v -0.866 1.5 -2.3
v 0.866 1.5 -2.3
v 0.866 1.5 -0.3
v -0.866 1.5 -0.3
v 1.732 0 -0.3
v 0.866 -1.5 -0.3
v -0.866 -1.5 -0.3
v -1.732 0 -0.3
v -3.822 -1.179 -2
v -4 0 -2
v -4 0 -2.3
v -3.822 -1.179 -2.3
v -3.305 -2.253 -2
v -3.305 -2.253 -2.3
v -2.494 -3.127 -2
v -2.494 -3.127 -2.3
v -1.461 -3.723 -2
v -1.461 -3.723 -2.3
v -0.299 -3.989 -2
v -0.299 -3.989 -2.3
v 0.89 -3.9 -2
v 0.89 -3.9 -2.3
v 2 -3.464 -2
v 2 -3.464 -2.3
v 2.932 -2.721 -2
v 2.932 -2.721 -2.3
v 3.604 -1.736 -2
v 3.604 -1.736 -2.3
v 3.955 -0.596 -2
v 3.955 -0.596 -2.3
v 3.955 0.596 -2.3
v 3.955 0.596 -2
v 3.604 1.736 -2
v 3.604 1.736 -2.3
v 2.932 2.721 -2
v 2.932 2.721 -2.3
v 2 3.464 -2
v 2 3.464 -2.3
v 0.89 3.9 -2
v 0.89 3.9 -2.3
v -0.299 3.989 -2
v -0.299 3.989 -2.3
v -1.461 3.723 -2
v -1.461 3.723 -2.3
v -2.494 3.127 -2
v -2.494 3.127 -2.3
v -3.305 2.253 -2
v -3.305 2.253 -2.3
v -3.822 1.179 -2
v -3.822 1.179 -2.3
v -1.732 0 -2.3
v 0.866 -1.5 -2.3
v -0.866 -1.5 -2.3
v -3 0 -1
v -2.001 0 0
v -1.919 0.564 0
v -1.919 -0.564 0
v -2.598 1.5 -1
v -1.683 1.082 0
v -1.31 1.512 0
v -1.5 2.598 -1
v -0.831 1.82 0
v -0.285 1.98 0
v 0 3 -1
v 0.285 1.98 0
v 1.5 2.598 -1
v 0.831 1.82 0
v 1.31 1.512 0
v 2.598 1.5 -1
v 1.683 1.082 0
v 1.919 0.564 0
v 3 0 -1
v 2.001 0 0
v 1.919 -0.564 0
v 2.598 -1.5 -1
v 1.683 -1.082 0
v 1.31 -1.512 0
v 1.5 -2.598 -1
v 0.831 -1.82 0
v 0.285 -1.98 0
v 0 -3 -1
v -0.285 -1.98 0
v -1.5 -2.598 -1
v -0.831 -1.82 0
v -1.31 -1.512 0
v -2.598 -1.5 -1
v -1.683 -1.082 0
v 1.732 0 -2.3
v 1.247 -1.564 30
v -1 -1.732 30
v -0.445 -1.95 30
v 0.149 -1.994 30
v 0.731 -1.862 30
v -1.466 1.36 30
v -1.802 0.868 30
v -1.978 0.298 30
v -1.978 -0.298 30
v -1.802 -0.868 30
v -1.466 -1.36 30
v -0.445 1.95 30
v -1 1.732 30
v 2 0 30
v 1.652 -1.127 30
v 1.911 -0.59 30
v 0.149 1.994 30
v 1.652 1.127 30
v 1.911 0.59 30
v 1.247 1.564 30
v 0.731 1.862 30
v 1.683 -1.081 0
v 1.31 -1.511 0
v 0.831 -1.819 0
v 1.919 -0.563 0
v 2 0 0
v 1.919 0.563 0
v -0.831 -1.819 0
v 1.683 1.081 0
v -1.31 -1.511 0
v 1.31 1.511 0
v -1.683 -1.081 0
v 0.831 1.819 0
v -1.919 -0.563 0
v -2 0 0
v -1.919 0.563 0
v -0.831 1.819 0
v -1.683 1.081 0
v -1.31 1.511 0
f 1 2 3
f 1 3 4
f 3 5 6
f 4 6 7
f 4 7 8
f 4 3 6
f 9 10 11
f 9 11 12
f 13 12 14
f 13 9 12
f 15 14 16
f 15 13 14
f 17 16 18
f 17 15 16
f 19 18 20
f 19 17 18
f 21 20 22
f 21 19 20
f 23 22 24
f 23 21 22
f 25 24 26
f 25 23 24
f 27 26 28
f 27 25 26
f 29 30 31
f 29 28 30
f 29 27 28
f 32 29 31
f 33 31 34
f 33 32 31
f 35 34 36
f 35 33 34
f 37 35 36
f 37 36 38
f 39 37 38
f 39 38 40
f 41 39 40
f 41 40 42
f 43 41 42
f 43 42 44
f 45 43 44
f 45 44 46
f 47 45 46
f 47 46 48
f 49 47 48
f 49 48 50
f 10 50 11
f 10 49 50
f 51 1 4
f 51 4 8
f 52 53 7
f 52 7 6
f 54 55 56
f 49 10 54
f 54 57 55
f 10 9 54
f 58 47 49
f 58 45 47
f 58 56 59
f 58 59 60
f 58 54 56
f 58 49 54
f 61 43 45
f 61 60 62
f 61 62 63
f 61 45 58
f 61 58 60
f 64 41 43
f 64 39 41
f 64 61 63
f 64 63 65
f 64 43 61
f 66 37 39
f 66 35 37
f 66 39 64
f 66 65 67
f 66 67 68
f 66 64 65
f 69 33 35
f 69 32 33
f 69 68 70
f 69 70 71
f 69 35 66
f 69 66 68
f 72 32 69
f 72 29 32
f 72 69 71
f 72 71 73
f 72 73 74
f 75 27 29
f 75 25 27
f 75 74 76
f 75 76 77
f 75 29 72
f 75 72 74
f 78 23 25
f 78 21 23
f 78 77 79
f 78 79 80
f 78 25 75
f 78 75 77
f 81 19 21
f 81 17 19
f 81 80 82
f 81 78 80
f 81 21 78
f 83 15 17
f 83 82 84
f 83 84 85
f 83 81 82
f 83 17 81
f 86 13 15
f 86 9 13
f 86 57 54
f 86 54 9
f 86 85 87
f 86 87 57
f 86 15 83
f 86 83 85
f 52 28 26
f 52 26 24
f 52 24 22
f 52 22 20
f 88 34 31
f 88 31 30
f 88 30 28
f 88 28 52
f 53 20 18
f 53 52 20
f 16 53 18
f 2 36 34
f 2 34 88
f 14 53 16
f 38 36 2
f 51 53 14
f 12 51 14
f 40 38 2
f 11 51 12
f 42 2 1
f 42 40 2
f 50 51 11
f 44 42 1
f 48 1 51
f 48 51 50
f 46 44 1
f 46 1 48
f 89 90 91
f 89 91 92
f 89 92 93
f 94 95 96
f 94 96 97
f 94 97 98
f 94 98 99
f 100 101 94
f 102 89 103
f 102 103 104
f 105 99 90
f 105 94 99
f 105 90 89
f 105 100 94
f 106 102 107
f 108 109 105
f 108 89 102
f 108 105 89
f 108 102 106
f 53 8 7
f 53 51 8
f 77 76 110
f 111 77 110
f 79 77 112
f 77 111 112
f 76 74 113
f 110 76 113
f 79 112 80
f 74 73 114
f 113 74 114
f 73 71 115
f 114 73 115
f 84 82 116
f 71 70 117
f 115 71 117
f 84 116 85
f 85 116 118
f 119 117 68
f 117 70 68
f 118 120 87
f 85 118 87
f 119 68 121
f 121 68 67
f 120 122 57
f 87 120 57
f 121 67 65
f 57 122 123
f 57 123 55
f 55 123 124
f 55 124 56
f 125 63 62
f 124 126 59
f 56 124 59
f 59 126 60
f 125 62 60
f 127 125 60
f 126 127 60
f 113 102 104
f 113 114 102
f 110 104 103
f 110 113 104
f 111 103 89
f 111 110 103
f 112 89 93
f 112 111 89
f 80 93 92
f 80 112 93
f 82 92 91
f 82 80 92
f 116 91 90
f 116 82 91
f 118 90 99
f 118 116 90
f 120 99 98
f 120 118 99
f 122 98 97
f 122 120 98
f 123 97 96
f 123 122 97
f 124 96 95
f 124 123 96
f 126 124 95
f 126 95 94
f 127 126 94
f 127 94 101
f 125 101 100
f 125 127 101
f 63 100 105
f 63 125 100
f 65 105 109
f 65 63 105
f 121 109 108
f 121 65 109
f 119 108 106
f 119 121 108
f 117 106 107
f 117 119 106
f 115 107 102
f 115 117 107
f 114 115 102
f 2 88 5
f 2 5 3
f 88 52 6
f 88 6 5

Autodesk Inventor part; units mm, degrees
ref_plane "YZ Plane" through (0, 0, 0) normal (1, 0, 0) x (0, 1, 0)
ref_plane "XZ Plane" through (0, 0, 0) normal (0, 1, 0) x (-1, 0, 0)
ref_plane "XY Plane" through (0, 0, 0) normal (0, 0, 1) x (1, 0, 0)
sketch "スケッチ1" plane through (0, 0, 0) normal (0, 0, 1) x (1, 0, 0)
  circle A0 centre (0, 0) radius 2
  dimension "d0" = 4
extrude "押し出し1" add sketch "スケッチ1" along normal blind 30
sketch "スケッチ2" plane through (0, 0, 0) normal (0, 0, -1) x (-1, 0, 0)
  circle A0 centre (0, 0) radius 4
  dimension "d3" = 8
extrude "押し出し2" add sketch "スケッチ2" along normal blind 2.3
chamfer "面取り1" distance 2 angle 45 1 edges at (4, 0, 0)
thread "ねじ1" size "M4x0.7" class "6g" standard "ANSI Metric M Profile" full length
sketch "スケッチ3" plane through (0, 0, -2.3) normal (0, 0, -1) x (-1, 0, 0)
  line L0 (1.7321, 0) -> (0.866, -1.5)
  line L1 (0.866, -1.5) -> (-0.866, -1.5)
  line L2 (-0.866, -1.5) -> (-1.7321, 0)
  line L3 (-1.7321, 0) -> (-0.866, 1.5)
  line L4 (-0.866, 1.5) -> (0.866, 1.5)
  line L5 (0.866, 1.5) -> (1.7321, 0)
  point P0 (0, 0)
  point P1 (0, 0)
  dimension "d11" = 3
extrude "押し出し3" cut sketch "スケッチ3" against normal blind 2
properties part number "M4皿ネジ　30" material "鉄 灰色"
